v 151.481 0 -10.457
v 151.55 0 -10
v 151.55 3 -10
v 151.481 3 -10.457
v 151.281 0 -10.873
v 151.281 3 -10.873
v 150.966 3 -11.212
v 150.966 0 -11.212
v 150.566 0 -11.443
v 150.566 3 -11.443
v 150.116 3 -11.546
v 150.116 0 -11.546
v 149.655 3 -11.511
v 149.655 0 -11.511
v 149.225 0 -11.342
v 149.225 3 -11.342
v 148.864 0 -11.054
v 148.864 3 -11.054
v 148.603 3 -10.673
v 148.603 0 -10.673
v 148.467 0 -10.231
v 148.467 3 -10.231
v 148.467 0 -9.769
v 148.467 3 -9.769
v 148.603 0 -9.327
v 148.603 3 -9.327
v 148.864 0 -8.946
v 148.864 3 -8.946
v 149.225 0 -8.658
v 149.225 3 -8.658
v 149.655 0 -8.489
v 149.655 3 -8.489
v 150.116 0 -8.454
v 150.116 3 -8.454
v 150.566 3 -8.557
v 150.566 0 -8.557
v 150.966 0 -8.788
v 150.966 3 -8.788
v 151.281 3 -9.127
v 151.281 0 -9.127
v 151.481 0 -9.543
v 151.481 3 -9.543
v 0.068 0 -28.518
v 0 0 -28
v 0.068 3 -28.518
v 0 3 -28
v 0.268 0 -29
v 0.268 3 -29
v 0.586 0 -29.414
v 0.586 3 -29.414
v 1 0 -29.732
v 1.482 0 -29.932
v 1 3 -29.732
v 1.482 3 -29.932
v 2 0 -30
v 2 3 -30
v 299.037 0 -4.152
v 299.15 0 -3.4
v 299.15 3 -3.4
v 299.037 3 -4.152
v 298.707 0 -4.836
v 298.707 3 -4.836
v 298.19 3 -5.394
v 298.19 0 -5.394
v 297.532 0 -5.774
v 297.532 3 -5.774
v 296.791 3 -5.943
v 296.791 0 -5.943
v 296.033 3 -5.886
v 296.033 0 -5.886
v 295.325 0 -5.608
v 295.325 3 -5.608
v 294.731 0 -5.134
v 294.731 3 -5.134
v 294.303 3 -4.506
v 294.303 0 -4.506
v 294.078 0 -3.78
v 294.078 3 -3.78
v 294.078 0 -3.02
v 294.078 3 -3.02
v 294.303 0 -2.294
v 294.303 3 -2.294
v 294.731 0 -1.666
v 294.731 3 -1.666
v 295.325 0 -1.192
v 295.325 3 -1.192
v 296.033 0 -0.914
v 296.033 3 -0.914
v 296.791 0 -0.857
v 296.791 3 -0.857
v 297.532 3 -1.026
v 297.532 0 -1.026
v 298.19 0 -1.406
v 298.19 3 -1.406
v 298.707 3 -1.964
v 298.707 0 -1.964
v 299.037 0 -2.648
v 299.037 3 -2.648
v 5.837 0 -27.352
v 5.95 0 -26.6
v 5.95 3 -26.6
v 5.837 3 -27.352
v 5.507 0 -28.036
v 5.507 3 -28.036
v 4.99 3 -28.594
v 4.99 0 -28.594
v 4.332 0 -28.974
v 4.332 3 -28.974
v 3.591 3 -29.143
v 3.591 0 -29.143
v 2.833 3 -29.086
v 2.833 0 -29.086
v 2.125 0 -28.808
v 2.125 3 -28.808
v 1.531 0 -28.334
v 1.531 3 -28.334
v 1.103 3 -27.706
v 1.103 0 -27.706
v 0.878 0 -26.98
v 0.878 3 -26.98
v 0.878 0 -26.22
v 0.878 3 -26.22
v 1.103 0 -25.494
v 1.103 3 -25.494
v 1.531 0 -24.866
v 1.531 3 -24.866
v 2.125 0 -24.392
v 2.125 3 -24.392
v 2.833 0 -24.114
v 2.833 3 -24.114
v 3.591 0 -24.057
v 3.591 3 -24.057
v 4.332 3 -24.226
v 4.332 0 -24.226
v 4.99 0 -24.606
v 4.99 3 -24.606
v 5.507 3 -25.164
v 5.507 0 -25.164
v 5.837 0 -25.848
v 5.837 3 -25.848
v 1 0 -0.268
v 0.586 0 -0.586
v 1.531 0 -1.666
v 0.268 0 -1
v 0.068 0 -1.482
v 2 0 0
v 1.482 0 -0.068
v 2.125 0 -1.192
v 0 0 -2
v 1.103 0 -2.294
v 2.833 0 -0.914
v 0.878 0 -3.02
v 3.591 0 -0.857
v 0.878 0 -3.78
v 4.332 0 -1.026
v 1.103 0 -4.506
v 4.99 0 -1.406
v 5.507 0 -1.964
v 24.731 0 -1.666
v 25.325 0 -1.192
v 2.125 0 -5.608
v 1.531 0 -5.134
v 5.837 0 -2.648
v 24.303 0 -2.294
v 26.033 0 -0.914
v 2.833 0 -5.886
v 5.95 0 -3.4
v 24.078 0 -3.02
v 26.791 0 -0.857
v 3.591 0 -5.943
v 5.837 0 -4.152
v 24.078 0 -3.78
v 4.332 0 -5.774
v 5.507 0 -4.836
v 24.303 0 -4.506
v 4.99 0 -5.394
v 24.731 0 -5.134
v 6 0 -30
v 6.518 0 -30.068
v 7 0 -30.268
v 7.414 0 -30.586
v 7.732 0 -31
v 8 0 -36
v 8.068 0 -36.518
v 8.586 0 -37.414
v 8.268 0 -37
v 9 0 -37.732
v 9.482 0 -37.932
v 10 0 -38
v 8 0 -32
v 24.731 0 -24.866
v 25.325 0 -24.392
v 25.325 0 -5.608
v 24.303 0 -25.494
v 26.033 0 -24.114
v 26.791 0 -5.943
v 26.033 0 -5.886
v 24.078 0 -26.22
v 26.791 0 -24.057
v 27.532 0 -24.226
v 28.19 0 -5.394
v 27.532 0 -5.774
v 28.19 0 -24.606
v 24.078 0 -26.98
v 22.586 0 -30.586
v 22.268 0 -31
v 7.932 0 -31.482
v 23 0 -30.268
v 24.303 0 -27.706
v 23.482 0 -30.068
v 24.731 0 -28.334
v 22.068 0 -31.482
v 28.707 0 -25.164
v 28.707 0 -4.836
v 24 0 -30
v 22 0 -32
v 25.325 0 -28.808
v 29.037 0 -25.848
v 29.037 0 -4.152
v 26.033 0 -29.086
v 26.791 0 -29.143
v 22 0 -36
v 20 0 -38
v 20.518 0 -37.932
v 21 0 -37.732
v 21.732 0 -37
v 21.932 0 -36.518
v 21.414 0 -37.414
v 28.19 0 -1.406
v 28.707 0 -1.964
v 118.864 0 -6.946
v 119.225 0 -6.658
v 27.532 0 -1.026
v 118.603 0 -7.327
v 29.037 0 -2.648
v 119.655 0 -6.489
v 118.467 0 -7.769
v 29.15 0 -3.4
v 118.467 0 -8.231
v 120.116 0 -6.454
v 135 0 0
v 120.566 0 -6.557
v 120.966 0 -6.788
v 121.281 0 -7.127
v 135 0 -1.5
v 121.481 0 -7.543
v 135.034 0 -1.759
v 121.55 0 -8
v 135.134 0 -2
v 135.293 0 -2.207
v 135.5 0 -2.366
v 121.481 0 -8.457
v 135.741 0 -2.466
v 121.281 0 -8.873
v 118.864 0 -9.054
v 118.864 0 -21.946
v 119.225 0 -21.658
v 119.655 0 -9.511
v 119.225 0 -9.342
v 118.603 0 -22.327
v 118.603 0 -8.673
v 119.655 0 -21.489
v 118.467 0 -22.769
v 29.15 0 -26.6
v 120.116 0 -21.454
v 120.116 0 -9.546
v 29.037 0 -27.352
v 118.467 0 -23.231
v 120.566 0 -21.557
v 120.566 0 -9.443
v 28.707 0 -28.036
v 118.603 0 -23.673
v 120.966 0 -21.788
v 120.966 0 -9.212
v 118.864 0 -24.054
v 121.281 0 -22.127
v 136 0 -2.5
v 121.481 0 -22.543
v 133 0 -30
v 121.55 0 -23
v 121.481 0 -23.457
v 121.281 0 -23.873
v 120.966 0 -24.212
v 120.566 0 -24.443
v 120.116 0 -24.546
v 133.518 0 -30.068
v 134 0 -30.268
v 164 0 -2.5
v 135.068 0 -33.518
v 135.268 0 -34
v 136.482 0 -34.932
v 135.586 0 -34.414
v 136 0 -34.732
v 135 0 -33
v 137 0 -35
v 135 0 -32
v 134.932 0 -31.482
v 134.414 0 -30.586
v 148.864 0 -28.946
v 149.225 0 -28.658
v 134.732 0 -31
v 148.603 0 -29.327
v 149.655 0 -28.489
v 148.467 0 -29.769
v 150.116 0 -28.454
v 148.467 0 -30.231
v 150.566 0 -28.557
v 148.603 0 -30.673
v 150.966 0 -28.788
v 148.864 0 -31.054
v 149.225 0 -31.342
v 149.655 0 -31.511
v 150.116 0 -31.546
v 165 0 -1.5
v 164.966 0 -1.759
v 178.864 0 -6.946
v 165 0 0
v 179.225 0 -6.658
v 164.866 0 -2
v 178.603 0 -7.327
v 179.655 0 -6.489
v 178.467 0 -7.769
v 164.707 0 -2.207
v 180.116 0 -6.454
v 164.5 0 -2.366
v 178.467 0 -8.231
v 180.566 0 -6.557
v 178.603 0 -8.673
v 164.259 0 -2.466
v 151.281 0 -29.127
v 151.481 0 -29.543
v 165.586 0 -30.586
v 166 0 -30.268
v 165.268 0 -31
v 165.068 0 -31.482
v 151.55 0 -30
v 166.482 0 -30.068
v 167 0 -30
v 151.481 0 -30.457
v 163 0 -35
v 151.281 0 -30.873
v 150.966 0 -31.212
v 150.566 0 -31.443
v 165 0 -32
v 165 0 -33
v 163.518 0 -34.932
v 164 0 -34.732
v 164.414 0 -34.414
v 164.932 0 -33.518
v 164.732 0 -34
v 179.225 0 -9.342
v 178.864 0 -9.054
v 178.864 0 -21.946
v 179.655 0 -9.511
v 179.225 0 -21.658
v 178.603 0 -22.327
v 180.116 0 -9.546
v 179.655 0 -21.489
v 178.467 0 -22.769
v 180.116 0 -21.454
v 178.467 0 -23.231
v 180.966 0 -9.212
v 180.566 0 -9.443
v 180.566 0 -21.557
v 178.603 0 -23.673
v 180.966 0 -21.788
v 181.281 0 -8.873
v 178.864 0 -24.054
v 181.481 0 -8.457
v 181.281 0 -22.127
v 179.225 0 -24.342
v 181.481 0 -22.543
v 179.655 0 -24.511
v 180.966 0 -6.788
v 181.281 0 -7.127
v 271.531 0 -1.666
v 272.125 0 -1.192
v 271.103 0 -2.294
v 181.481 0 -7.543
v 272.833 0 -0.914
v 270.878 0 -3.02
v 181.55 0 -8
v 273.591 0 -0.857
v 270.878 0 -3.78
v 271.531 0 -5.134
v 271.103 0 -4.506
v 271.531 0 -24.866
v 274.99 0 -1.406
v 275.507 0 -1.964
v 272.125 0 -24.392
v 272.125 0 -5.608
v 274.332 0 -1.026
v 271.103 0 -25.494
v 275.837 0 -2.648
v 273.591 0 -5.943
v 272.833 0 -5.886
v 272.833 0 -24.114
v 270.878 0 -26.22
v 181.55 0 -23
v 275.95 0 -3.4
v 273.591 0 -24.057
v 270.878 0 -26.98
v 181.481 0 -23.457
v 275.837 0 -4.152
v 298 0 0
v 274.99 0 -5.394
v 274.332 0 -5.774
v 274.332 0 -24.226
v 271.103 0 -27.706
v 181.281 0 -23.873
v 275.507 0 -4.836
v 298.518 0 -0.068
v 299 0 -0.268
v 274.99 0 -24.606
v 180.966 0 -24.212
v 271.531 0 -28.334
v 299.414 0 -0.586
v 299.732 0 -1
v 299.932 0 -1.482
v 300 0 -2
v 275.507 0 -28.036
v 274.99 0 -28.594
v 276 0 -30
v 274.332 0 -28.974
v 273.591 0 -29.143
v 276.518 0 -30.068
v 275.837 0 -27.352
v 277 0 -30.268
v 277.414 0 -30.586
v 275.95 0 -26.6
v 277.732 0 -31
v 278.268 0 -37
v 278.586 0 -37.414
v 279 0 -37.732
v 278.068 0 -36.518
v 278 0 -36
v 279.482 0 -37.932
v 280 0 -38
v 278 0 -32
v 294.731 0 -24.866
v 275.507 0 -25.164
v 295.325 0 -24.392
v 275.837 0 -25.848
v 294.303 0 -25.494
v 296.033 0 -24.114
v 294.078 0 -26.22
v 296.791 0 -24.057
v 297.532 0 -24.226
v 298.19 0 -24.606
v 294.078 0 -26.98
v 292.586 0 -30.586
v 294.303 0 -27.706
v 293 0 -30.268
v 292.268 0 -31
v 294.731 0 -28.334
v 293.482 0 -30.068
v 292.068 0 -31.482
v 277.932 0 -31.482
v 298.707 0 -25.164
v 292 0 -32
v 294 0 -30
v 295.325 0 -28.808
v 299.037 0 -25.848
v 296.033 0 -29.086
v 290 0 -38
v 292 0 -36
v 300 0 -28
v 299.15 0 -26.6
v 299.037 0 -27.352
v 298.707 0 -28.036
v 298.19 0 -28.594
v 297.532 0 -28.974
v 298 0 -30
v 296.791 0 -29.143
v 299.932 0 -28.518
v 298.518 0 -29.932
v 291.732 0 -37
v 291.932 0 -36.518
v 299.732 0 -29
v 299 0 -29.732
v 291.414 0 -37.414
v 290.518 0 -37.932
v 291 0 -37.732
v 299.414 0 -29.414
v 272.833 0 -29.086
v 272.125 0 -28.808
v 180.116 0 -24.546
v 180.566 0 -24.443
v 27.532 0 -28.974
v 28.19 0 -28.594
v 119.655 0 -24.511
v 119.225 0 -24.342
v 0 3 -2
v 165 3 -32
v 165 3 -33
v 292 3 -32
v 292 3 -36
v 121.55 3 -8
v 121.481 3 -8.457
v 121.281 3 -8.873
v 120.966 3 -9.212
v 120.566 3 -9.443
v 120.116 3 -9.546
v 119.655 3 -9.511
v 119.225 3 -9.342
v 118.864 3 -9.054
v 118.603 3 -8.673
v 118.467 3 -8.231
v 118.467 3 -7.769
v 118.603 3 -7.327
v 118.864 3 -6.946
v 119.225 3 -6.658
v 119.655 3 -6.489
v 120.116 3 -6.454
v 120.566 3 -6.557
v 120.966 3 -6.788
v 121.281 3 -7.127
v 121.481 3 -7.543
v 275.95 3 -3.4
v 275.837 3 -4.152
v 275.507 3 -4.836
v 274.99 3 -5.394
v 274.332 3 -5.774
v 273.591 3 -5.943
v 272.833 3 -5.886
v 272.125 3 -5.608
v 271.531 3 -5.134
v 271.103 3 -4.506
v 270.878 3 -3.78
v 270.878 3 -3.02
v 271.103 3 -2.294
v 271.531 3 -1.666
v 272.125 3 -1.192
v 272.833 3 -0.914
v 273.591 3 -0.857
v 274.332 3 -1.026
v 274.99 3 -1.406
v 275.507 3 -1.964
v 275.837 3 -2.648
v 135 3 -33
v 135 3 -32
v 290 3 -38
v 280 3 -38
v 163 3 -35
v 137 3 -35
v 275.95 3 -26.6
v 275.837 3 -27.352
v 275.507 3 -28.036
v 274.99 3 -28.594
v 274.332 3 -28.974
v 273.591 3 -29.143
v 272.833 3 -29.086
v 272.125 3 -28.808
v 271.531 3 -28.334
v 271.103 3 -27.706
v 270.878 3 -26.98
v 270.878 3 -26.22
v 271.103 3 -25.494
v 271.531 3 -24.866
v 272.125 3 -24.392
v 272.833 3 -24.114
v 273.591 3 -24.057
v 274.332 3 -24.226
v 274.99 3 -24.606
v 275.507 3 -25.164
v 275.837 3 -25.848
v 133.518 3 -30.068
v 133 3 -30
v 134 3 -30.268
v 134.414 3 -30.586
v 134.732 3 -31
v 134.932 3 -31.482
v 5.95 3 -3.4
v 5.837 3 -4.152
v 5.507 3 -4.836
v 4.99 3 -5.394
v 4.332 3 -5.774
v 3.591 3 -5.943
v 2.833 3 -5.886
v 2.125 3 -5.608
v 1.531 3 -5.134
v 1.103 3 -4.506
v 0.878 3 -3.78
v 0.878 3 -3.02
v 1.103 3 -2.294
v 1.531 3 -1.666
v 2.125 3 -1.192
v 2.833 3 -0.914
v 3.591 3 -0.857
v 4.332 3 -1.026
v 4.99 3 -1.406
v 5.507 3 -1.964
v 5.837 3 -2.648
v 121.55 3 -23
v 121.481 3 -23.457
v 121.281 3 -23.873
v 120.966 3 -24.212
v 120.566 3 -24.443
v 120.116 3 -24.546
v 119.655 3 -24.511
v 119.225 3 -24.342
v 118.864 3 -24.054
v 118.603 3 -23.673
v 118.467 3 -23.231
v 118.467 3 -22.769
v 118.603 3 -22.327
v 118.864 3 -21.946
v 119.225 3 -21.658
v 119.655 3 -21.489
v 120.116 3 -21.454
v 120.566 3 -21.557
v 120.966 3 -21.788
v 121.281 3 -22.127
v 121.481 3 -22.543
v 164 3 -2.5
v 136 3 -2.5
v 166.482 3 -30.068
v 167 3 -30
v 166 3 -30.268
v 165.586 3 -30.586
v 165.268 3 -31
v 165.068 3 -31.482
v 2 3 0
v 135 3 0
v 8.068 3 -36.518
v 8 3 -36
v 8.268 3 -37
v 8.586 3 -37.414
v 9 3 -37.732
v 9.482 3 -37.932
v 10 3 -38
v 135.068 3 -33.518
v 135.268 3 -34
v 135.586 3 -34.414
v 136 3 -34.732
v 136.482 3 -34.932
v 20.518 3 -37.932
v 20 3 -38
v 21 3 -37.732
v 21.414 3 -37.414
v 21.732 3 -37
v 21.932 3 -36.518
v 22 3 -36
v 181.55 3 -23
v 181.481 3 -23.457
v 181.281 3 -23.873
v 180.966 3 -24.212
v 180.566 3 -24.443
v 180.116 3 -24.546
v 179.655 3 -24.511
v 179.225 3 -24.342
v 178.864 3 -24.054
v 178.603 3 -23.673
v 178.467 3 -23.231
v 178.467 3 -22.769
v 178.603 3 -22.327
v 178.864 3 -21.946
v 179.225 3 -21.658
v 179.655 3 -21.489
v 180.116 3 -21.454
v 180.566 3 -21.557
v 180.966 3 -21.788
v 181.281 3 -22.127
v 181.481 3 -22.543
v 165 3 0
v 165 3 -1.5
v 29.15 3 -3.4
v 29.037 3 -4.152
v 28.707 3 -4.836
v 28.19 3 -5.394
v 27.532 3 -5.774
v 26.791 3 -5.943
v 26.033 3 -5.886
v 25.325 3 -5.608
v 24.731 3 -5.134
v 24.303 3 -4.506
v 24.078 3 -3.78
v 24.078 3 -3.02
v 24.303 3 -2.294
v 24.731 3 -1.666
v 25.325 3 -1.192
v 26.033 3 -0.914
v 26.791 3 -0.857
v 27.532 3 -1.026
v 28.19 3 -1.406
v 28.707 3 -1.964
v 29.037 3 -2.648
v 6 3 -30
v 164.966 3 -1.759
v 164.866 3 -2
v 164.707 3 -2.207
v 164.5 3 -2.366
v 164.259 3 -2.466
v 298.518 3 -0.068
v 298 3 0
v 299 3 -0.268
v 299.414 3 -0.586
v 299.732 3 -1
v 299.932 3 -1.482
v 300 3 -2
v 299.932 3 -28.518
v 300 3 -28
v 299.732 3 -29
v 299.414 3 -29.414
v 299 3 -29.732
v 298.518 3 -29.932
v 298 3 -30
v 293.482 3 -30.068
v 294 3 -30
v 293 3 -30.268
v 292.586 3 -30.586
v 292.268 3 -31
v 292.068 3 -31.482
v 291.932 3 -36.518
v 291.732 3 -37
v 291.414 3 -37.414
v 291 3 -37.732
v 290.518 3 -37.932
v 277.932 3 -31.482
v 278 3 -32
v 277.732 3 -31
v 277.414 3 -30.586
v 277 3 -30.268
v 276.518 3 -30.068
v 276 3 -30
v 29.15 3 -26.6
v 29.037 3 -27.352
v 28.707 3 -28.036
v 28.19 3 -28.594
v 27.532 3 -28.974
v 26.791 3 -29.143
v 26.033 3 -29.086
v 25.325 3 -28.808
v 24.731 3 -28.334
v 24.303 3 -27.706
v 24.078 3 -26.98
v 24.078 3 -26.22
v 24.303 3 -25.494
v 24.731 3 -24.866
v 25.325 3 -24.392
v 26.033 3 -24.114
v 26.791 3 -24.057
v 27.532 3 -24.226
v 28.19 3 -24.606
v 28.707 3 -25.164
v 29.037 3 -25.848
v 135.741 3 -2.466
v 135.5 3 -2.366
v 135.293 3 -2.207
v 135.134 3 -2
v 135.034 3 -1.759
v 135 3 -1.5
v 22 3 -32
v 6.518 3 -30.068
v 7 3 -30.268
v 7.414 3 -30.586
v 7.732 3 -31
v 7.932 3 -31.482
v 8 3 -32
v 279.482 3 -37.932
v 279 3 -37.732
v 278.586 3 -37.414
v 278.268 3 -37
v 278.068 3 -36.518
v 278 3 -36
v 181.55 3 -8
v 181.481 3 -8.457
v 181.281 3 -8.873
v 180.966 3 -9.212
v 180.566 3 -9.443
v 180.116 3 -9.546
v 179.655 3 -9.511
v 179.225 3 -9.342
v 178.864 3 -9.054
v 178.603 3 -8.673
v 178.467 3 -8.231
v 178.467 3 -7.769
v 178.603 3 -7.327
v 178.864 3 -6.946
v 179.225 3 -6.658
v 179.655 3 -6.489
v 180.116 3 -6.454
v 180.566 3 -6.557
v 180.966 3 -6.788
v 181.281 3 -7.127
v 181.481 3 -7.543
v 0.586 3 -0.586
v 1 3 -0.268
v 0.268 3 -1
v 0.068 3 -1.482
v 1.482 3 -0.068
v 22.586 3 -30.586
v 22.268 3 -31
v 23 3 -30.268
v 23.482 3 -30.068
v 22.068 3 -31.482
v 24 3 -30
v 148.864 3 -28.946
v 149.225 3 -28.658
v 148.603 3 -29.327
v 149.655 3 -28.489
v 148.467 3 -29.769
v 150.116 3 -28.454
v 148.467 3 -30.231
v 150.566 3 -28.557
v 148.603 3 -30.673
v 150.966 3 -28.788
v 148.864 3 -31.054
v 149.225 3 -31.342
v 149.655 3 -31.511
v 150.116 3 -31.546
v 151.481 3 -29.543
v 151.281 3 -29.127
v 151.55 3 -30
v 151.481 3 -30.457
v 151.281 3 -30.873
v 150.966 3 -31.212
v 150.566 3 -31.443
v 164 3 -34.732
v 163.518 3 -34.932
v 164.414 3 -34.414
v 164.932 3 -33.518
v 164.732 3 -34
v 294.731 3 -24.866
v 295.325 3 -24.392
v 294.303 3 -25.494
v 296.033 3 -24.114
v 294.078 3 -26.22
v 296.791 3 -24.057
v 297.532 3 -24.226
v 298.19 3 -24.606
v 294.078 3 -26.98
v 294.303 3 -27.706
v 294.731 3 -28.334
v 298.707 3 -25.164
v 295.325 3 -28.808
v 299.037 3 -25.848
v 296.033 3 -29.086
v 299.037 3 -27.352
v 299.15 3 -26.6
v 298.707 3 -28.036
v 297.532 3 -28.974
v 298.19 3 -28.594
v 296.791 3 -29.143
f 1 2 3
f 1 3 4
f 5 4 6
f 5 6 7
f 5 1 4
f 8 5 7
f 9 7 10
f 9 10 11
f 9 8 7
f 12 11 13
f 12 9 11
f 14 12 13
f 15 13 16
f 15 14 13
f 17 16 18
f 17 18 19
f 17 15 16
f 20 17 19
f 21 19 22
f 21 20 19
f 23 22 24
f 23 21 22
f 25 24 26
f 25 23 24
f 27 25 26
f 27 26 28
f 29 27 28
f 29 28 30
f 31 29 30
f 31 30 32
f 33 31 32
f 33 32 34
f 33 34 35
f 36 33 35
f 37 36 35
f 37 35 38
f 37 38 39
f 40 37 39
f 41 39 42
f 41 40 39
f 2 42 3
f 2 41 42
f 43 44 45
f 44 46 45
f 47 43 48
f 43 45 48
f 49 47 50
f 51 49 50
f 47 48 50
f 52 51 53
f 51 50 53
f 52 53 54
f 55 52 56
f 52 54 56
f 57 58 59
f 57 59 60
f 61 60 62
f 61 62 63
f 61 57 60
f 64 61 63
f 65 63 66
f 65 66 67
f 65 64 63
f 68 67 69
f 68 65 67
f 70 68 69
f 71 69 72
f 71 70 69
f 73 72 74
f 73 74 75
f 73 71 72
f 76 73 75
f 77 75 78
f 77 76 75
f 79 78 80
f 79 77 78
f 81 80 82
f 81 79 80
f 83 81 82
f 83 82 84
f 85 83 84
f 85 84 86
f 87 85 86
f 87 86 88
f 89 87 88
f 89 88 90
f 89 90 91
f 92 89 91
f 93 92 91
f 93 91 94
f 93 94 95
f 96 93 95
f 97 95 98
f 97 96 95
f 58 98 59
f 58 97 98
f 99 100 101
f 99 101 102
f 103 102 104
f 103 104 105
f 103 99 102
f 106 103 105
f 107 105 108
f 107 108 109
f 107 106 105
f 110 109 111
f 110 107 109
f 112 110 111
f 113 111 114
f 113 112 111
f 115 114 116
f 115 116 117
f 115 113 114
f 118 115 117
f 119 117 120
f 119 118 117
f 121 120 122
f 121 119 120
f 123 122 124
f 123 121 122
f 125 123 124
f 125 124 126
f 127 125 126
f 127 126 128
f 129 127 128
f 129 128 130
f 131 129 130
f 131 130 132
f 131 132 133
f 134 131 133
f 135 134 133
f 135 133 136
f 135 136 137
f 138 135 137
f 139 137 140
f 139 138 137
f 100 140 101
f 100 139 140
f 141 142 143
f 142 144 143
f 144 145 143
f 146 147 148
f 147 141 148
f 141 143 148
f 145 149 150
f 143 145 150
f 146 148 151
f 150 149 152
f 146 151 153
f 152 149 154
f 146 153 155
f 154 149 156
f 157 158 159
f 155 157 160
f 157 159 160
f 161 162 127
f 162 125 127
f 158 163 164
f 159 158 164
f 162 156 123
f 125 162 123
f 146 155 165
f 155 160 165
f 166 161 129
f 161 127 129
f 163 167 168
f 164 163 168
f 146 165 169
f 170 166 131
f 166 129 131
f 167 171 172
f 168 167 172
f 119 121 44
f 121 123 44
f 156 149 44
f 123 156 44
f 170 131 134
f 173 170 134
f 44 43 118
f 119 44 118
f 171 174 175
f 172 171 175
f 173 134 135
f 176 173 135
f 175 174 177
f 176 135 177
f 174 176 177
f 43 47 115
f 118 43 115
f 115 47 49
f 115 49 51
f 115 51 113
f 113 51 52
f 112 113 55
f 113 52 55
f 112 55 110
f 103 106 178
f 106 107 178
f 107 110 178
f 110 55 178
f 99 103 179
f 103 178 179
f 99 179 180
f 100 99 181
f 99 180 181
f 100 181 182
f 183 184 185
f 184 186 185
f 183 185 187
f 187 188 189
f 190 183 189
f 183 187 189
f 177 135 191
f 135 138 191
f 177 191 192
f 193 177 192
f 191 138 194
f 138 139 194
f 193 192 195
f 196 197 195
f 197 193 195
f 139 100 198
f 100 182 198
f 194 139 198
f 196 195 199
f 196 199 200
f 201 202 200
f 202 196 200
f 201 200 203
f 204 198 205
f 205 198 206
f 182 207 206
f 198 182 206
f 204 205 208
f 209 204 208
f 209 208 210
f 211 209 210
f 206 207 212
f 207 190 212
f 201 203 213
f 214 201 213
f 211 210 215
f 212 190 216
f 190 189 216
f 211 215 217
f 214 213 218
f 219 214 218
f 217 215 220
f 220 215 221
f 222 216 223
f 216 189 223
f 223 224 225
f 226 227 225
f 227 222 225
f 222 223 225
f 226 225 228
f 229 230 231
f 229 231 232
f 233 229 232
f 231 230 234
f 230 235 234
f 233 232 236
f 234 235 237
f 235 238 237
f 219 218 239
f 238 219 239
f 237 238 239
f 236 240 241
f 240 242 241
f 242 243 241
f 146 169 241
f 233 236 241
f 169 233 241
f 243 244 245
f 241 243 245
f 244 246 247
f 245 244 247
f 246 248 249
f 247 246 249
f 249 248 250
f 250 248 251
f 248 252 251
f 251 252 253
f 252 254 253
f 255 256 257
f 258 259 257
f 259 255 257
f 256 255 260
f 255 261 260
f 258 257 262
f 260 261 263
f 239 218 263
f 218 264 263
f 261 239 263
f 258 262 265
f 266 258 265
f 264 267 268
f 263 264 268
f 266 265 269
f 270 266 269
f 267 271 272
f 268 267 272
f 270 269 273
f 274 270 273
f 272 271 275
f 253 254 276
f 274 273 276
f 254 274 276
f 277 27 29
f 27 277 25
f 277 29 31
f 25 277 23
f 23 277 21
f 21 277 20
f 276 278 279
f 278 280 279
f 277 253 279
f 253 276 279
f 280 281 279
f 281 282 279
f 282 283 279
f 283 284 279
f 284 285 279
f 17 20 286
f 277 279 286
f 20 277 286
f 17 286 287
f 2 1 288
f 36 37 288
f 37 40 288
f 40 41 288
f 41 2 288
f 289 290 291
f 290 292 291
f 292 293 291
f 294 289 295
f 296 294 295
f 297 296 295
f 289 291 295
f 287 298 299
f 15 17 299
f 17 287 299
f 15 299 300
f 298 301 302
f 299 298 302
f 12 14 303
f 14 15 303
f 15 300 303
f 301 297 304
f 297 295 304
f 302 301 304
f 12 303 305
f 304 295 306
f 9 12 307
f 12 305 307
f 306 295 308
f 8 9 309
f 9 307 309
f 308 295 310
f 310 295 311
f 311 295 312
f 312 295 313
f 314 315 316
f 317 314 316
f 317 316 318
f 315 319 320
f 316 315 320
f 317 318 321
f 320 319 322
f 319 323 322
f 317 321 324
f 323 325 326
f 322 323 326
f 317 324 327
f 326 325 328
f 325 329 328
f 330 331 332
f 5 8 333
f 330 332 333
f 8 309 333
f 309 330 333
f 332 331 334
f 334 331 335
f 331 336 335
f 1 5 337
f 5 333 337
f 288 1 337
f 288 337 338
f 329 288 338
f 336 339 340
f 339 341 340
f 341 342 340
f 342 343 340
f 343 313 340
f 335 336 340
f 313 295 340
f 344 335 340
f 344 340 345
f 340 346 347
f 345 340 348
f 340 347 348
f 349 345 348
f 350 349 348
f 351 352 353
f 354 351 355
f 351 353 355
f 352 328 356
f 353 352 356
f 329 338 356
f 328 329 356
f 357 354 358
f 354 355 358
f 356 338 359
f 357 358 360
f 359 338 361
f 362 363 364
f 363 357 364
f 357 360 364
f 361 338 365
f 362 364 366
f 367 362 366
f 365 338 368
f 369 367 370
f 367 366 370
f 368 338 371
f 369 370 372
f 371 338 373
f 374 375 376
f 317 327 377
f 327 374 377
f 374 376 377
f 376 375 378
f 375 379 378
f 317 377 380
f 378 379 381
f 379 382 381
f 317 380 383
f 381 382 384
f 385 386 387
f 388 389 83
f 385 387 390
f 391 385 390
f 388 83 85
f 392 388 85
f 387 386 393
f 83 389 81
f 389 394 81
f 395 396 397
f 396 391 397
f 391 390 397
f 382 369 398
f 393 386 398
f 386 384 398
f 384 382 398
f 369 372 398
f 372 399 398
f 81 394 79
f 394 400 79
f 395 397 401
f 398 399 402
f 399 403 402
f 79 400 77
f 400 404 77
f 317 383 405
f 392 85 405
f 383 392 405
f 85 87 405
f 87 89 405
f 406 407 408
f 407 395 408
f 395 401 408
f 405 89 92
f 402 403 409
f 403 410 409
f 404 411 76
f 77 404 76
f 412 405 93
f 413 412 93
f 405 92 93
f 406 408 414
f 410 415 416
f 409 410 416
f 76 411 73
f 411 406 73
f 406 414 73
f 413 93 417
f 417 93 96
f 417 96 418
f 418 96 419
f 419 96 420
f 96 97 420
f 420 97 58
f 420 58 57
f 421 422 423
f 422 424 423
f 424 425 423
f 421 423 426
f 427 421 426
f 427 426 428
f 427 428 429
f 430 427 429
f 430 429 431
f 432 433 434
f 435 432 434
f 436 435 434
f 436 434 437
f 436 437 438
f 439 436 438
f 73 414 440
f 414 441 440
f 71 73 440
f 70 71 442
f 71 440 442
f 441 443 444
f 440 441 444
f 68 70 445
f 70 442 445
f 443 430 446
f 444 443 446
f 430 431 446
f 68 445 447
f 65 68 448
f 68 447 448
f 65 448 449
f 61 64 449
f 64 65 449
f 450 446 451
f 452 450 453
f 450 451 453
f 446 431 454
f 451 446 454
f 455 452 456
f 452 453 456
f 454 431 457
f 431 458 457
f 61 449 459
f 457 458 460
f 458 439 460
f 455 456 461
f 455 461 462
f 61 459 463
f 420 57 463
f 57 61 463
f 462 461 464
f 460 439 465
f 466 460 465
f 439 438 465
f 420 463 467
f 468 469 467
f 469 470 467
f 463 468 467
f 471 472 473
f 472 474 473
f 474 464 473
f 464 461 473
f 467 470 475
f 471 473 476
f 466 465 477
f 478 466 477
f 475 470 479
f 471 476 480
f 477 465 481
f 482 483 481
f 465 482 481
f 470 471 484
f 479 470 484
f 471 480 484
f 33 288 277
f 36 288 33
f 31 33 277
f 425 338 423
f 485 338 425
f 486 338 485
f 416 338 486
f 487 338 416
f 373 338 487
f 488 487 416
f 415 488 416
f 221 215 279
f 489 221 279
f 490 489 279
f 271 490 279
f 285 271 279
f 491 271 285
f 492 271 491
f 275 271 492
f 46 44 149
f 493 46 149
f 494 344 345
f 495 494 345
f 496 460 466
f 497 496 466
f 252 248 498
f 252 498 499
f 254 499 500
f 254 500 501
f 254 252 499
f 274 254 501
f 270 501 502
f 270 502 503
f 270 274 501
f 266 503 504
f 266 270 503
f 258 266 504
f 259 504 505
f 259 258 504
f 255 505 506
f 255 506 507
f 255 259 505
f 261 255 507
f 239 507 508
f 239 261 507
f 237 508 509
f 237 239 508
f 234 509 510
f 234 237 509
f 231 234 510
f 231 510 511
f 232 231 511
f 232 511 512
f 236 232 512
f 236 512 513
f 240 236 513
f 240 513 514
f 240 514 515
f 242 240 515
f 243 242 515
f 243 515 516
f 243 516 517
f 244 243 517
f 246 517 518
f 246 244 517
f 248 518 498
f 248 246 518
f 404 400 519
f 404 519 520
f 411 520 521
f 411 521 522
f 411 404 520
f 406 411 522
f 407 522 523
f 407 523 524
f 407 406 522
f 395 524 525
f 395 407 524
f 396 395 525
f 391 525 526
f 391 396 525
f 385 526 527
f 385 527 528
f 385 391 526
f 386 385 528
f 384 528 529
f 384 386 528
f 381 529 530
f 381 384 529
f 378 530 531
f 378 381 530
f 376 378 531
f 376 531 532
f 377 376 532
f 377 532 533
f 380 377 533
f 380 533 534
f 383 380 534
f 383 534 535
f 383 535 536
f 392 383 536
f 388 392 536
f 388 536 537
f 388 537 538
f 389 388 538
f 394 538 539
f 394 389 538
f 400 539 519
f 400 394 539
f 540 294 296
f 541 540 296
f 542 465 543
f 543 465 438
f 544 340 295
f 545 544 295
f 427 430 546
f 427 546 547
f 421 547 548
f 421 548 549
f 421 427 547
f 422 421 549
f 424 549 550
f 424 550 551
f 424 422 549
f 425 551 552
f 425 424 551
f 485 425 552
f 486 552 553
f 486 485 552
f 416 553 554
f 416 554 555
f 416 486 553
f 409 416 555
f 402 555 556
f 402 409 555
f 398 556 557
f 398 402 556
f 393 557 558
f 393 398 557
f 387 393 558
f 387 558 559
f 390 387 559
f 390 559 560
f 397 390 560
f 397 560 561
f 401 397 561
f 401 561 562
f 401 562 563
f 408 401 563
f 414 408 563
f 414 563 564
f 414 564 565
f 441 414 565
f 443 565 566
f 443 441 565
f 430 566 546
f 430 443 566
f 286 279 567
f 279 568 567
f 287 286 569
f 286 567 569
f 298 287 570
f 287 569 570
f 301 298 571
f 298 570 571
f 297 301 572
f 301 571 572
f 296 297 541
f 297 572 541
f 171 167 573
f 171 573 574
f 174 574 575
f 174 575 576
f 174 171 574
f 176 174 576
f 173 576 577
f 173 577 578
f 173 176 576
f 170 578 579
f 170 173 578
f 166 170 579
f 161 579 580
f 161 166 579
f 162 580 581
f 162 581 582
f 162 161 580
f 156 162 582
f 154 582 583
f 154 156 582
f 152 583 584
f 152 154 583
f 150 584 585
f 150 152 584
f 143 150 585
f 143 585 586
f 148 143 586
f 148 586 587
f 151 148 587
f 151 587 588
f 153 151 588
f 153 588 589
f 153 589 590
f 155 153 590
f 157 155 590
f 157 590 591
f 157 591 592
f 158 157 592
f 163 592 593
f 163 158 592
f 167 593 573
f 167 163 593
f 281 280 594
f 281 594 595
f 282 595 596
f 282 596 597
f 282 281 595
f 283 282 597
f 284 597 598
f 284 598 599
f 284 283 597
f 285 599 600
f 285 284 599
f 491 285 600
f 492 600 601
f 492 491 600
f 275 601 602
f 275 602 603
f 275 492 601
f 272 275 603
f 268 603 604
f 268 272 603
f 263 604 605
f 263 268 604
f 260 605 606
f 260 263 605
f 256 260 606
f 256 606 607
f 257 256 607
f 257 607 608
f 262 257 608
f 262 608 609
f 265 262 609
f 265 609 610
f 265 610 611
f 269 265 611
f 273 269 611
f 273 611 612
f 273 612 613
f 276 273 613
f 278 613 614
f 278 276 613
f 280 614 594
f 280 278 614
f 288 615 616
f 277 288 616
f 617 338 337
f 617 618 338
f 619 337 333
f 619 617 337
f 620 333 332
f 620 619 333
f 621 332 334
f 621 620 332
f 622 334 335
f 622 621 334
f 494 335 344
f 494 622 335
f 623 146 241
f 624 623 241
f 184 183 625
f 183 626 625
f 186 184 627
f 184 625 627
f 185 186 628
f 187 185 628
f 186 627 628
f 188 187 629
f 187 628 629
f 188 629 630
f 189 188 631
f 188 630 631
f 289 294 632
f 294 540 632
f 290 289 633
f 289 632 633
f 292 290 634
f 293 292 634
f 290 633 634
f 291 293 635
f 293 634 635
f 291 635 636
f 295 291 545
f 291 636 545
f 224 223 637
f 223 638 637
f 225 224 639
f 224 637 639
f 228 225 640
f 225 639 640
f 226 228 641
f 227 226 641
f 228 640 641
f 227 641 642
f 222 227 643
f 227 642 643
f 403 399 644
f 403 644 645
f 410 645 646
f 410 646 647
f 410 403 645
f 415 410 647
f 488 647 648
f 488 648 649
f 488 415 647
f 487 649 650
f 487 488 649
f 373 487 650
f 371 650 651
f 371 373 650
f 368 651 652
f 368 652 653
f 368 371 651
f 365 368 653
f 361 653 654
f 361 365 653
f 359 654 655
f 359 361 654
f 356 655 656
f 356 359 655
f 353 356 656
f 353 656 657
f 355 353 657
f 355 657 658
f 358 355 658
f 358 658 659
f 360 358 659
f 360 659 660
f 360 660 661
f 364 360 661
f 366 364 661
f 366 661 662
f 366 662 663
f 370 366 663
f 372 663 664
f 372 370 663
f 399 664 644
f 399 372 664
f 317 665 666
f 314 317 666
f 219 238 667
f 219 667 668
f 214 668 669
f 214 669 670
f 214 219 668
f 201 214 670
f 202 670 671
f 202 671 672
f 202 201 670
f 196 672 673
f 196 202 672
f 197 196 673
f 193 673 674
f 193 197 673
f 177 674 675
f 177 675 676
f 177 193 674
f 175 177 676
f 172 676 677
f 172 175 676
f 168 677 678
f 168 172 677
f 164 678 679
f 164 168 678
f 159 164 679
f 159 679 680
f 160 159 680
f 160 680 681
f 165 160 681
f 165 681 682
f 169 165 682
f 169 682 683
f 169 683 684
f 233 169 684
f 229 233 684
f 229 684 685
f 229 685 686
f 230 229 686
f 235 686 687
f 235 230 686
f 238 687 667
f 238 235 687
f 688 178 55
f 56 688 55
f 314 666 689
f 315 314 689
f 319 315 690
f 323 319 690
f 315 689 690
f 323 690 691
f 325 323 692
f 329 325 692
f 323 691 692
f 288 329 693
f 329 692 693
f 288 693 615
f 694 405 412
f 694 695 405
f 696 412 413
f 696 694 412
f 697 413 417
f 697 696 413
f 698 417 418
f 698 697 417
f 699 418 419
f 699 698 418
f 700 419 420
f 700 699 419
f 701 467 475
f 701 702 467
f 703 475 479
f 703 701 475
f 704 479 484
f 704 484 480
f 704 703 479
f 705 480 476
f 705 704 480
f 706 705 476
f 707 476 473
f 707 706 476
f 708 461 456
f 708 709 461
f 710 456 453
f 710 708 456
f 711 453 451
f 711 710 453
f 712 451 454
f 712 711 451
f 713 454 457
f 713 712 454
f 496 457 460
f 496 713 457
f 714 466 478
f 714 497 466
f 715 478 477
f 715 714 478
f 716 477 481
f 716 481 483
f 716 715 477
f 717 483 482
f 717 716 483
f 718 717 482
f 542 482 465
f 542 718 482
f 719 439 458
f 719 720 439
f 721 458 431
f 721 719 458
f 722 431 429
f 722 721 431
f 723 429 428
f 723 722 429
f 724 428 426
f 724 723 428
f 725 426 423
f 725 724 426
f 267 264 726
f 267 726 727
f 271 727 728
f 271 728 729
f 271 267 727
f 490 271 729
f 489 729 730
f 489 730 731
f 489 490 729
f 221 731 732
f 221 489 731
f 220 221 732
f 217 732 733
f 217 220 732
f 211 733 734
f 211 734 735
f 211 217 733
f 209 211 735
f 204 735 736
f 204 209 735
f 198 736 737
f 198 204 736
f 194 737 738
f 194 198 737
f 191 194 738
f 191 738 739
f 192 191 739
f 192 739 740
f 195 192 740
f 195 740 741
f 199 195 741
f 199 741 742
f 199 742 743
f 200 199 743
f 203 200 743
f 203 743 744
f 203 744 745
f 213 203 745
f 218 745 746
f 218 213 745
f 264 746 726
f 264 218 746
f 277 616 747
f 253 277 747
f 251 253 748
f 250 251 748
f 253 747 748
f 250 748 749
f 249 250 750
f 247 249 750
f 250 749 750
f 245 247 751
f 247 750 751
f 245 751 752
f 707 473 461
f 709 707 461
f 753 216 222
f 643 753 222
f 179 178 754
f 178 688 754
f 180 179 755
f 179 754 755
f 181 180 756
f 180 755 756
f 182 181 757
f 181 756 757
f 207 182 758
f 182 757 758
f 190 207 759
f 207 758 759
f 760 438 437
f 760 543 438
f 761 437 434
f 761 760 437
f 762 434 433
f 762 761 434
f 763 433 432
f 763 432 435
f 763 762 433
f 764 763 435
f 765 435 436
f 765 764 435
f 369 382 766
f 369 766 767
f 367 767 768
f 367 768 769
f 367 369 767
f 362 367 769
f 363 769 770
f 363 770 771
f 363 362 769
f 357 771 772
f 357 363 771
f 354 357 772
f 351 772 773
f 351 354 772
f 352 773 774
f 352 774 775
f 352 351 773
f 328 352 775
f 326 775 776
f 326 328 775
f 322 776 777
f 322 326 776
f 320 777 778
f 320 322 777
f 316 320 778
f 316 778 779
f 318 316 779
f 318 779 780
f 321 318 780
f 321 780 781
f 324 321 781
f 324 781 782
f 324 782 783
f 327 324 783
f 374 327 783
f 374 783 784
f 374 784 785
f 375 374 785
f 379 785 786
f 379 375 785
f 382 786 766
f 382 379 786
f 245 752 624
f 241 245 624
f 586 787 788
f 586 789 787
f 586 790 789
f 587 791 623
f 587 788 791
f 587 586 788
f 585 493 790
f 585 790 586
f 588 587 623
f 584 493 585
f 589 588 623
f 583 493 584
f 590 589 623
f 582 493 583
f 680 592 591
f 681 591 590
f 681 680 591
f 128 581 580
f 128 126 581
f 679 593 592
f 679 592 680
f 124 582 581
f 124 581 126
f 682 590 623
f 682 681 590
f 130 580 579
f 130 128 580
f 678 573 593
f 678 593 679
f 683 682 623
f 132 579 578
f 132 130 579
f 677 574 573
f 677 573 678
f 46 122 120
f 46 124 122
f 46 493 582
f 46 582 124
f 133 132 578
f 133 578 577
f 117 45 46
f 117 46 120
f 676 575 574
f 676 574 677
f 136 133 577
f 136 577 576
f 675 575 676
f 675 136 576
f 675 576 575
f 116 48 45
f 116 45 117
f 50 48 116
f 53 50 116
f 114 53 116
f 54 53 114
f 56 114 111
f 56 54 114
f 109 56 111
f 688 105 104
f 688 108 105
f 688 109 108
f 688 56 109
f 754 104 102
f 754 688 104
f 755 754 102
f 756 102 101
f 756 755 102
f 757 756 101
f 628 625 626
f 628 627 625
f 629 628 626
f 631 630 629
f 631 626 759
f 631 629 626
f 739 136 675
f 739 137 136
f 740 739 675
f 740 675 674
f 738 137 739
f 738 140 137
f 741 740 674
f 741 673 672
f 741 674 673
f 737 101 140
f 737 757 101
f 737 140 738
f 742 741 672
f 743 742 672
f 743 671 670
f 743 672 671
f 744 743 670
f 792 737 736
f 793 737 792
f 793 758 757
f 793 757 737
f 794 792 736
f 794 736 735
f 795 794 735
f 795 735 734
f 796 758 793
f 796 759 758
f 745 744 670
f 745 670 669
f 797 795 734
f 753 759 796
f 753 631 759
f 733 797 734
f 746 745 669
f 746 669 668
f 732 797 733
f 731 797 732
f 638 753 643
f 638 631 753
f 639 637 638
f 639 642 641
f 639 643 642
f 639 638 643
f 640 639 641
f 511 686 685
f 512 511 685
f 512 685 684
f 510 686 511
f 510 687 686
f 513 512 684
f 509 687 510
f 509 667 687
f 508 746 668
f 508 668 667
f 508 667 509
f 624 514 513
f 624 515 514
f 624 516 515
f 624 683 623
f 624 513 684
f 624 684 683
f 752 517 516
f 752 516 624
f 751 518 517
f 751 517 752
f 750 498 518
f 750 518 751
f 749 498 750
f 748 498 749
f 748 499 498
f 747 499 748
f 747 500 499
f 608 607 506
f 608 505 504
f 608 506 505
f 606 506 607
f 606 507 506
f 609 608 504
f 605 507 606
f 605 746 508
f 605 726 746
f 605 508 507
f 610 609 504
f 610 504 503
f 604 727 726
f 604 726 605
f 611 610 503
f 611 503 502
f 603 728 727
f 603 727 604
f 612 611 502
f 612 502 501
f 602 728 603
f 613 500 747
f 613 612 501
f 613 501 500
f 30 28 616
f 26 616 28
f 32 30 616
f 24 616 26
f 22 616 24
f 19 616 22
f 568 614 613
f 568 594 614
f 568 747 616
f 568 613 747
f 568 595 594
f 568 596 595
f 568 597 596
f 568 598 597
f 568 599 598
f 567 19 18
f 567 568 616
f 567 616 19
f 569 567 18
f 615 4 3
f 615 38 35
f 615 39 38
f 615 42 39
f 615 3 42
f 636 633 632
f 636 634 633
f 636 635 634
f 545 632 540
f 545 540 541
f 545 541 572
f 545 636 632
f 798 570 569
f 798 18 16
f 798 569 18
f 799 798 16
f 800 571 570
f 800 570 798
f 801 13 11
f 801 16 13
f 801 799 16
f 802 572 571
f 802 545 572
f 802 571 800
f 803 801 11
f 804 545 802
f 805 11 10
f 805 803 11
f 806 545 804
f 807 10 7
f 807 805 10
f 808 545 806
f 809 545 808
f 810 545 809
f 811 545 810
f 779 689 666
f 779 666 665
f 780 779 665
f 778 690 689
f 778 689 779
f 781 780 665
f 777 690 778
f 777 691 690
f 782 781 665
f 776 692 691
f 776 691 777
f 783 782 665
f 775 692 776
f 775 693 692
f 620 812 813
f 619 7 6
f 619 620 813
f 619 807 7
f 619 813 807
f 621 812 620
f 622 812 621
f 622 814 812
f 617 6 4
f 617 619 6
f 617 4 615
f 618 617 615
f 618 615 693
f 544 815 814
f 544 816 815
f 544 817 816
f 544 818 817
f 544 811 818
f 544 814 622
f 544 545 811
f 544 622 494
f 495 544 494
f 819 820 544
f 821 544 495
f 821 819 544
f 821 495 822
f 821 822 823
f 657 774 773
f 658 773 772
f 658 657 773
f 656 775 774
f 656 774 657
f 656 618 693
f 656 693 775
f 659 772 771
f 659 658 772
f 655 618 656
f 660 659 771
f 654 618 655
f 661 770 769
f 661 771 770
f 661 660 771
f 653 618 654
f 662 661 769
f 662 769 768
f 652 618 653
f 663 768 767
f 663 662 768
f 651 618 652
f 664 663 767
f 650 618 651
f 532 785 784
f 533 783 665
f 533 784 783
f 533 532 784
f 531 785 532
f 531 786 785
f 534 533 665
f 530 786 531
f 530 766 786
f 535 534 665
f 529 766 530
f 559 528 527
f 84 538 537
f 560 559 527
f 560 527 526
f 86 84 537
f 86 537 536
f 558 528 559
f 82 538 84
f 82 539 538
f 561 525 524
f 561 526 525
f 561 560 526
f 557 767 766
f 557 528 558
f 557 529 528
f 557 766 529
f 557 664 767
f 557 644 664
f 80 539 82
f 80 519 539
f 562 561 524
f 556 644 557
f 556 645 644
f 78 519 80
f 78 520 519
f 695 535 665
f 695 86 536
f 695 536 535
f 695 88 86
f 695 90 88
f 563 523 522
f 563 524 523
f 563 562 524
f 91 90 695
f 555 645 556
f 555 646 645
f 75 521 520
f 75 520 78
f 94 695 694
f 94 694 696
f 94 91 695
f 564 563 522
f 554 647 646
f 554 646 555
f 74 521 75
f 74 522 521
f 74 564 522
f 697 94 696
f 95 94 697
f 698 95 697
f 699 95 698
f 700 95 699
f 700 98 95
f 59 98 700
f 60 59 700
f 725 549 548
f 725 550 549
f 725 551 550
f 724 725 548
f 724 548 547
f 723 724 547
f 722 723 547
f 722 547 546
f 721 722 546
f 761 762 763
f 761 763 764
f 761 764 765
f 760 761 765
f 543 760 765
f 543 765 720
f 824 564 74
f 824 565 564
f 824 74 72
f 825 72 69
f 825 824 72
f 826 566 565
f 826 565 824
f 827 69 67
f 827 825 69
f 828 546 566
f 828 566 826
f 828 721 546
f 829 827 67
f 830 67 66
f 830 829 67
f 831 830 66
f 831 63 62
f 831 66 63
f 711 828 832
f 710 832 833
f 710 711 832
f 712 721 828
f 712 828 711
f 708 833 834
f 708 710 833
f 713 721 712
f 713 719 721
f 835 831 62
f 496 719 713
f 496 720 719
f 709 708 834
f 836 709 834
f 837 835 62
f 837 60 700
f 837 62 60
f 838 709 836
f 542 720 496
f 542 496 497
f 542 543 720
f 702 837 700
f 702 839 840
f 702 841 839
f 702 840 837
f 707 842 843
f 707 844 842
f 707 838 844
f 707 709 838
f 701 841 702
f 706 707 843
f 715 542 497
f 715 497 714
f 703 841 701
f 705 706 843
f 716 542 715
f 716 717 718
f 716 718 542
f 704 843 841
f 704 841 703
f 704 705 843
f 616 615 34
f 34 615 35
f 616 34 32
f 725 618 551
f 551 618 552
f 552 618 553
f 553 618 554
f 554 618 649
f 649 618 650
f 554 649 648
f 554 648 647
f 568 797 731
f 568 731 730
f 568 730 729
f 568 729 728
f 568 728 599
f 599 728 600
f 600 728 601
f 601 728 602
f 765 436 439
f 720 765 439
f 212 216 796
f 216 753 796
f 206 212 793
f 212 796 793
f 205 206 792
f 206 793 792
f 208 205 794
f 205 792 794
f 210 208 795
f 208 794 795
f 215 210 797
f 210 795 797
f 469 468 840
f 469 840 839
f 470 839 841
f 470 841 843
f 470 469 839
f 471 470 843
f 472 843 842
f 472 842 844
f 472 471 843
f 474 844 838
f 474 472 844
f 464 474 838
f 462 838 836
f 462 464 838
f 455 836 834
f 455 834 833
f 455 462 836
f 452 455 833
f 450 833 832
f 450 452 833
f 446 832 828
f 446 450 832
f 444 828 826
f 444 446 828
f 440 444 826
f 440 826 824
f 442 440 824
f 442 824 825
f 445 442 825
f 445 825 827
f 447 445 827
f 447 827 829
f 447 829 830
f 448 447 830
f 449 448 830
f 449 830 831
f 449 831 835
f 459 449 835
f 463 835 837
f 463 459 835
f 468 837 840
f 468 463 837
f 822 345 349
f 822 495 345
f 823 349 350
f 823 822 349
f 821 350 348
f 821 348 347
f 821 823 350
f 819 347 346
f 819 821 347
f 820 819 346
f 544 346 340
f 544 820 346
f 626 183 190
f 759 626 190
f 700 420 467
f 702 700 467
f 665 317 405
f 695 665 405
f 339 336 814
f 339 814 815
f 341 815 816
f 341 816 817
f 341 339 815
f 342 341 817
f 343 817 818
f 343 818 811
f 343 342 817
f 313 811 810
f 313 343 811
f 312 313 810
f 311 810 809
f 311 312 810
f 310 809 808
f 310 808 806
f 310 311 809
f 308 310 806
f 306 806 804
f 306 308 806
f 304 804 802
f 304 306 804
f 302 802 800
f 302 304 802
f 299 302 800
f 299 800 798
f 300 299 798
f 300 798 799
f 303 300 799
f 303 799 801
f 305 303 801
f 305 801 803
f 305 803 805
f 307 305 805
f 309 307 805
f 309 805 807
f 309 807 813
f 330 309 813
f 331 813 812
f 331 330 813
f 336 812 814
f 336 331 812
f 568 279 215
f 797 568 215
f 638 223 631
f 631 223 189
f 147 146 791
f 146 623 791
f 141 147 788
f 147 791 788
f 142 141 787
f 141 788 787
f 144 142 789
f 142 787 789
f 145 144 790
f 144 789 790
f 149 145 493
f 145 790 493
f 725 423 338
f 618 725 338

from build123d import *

# Parameters (mm, degrees)
CROQUIS1_R              = 2.55
CROQUIS1_R_2            = 1.55
SALIENTE_EXTRUIR1_DEPTH = 3
REDONDEO2_R             = 2
CORTAR_EXTRUIR1_DEPTH   = 3


with BuildPart() as part:
    # Croquis1 → Saliente-Extruir1 (new body)
    with BuildSketch(Plane(origin=(0, 0, 0), x_dir=(1, 0, 0), z_dir=(0, 1, 0))):
        Polygon((0, 0), (300, 0), (300, 30), (292, 30), (292, 38), (278, 38), (278, 30), (165, 30), (165, 35), (135, 35), (135, 30), (22, 30), (22, 38), (8, 38), (8, 30), (0, 30), align=None)
        with Locations((3.4, 26.6)):
            Circle(CROQUIS1_R, mode=Mode.SUBTRACT)
        with Locations((26.6, 26.6)):
            Circle(CROQUIS1_R, mode=Mode.SUBTRACT)
        with Locations((26.6, 3.4)):
            Circle(CROQUIS1_R, mode=Mode.SUBTRACT)
        with Locations((3.4, 3.4)):
            Circle(CROQUIS1_R, mode=Mode.SUBTRACT)
        with Locations((273.4, 3.4)):
            Circle(CROQUIS1_R, mode=Mode.SUBTRACT)
        with Locations((296.6, 3.4)):
            Circle(CROQUIS1_R, mode=Mode.SUBTRACT)
        with Locations((296.6, 26.6)):
            Circle(CROQUIS1_R, mode=Mode.SUBTRACT)
        with Locations((273.4, 26.6)):
            Circle(CROQUIS1_R, mode=Mode.SUBTRACT)
        with Locations((150, 30)):
            Circle(CROQUIS1_R_2, mode=Mode.SUBTRACT)
        with Locations((150, 10)):
            Circle(CROQUIS1_R_2, mode=Mode.SUBTRACT)
        with Locations((120, 23)):
            Circle(CROQUIS1_R_2, mode=Mode.SUBTRACT)
        with Locations((120, 8)):
            Circle(CROQUIS1_R_2, mode=Mode.SUBTRACT)
        with Locations((180, 8)):
            Circle(CROQUIS1_R_2, mode=Mode.SUBTRACT)
        with Locations((180, 23)):
            Circle(CROQUIS1_R_2, mode=Mode.SUBTRACT)
    extrude(amount=SALIENTE_EXTRUIR1_DEPTH)

    # Redondeo2
    redondeo2_edges = [part.edges().sort_by_distance(p)[0] for p in [
        (0, 1.5, -30),
        (8, 1.5, -30),
        (8, 1.5, -38),
        (22, 1.5, -38),
        (22, 1.5, -30),
        (135, 1.5, -30),
        (135, 1.5, -35),
        (165, 1.5, -35),
        (165, 1.5, -30),
        (278, 1.5, -30),
        (278, 1.5, -38),
        (292, 1.5, -38),
        (292, 1.5, -30),
        (300, 1.5, -30),
        (300, 1.5, 0),
        (0, 1.5, 0),
    ]]
    fillet(redondeo2_edges, radius=REDONDEO2_R)

    # Croquis2 → Cortar-Extruir1 (cut)
    with BuildSketch(Plane(origin=(0, 3, 0), x_dir=(1, 0, 0), z_dir=(0, 1, 0))):
        with BuildLine():
            Line((135, 0), (165, 0))
            Line((165, 0), (165, 1.5))
            ThreePointArc((165, 1.5), (164.707106781, 2.207106781), (164, 2.5))
            Line((164, 2.5), (136, 2.5))
            ThreePointArc((136, 2.5), (135.292893219, 2.207106781), (135, 1.5))
            Line((135, 1.5), (135, 0))
        make_face()
    extrude(amount=-CORTAR_EXTRUIR1_DEPTH, mode=Mode.SUBTRACT)


solid = part.part
